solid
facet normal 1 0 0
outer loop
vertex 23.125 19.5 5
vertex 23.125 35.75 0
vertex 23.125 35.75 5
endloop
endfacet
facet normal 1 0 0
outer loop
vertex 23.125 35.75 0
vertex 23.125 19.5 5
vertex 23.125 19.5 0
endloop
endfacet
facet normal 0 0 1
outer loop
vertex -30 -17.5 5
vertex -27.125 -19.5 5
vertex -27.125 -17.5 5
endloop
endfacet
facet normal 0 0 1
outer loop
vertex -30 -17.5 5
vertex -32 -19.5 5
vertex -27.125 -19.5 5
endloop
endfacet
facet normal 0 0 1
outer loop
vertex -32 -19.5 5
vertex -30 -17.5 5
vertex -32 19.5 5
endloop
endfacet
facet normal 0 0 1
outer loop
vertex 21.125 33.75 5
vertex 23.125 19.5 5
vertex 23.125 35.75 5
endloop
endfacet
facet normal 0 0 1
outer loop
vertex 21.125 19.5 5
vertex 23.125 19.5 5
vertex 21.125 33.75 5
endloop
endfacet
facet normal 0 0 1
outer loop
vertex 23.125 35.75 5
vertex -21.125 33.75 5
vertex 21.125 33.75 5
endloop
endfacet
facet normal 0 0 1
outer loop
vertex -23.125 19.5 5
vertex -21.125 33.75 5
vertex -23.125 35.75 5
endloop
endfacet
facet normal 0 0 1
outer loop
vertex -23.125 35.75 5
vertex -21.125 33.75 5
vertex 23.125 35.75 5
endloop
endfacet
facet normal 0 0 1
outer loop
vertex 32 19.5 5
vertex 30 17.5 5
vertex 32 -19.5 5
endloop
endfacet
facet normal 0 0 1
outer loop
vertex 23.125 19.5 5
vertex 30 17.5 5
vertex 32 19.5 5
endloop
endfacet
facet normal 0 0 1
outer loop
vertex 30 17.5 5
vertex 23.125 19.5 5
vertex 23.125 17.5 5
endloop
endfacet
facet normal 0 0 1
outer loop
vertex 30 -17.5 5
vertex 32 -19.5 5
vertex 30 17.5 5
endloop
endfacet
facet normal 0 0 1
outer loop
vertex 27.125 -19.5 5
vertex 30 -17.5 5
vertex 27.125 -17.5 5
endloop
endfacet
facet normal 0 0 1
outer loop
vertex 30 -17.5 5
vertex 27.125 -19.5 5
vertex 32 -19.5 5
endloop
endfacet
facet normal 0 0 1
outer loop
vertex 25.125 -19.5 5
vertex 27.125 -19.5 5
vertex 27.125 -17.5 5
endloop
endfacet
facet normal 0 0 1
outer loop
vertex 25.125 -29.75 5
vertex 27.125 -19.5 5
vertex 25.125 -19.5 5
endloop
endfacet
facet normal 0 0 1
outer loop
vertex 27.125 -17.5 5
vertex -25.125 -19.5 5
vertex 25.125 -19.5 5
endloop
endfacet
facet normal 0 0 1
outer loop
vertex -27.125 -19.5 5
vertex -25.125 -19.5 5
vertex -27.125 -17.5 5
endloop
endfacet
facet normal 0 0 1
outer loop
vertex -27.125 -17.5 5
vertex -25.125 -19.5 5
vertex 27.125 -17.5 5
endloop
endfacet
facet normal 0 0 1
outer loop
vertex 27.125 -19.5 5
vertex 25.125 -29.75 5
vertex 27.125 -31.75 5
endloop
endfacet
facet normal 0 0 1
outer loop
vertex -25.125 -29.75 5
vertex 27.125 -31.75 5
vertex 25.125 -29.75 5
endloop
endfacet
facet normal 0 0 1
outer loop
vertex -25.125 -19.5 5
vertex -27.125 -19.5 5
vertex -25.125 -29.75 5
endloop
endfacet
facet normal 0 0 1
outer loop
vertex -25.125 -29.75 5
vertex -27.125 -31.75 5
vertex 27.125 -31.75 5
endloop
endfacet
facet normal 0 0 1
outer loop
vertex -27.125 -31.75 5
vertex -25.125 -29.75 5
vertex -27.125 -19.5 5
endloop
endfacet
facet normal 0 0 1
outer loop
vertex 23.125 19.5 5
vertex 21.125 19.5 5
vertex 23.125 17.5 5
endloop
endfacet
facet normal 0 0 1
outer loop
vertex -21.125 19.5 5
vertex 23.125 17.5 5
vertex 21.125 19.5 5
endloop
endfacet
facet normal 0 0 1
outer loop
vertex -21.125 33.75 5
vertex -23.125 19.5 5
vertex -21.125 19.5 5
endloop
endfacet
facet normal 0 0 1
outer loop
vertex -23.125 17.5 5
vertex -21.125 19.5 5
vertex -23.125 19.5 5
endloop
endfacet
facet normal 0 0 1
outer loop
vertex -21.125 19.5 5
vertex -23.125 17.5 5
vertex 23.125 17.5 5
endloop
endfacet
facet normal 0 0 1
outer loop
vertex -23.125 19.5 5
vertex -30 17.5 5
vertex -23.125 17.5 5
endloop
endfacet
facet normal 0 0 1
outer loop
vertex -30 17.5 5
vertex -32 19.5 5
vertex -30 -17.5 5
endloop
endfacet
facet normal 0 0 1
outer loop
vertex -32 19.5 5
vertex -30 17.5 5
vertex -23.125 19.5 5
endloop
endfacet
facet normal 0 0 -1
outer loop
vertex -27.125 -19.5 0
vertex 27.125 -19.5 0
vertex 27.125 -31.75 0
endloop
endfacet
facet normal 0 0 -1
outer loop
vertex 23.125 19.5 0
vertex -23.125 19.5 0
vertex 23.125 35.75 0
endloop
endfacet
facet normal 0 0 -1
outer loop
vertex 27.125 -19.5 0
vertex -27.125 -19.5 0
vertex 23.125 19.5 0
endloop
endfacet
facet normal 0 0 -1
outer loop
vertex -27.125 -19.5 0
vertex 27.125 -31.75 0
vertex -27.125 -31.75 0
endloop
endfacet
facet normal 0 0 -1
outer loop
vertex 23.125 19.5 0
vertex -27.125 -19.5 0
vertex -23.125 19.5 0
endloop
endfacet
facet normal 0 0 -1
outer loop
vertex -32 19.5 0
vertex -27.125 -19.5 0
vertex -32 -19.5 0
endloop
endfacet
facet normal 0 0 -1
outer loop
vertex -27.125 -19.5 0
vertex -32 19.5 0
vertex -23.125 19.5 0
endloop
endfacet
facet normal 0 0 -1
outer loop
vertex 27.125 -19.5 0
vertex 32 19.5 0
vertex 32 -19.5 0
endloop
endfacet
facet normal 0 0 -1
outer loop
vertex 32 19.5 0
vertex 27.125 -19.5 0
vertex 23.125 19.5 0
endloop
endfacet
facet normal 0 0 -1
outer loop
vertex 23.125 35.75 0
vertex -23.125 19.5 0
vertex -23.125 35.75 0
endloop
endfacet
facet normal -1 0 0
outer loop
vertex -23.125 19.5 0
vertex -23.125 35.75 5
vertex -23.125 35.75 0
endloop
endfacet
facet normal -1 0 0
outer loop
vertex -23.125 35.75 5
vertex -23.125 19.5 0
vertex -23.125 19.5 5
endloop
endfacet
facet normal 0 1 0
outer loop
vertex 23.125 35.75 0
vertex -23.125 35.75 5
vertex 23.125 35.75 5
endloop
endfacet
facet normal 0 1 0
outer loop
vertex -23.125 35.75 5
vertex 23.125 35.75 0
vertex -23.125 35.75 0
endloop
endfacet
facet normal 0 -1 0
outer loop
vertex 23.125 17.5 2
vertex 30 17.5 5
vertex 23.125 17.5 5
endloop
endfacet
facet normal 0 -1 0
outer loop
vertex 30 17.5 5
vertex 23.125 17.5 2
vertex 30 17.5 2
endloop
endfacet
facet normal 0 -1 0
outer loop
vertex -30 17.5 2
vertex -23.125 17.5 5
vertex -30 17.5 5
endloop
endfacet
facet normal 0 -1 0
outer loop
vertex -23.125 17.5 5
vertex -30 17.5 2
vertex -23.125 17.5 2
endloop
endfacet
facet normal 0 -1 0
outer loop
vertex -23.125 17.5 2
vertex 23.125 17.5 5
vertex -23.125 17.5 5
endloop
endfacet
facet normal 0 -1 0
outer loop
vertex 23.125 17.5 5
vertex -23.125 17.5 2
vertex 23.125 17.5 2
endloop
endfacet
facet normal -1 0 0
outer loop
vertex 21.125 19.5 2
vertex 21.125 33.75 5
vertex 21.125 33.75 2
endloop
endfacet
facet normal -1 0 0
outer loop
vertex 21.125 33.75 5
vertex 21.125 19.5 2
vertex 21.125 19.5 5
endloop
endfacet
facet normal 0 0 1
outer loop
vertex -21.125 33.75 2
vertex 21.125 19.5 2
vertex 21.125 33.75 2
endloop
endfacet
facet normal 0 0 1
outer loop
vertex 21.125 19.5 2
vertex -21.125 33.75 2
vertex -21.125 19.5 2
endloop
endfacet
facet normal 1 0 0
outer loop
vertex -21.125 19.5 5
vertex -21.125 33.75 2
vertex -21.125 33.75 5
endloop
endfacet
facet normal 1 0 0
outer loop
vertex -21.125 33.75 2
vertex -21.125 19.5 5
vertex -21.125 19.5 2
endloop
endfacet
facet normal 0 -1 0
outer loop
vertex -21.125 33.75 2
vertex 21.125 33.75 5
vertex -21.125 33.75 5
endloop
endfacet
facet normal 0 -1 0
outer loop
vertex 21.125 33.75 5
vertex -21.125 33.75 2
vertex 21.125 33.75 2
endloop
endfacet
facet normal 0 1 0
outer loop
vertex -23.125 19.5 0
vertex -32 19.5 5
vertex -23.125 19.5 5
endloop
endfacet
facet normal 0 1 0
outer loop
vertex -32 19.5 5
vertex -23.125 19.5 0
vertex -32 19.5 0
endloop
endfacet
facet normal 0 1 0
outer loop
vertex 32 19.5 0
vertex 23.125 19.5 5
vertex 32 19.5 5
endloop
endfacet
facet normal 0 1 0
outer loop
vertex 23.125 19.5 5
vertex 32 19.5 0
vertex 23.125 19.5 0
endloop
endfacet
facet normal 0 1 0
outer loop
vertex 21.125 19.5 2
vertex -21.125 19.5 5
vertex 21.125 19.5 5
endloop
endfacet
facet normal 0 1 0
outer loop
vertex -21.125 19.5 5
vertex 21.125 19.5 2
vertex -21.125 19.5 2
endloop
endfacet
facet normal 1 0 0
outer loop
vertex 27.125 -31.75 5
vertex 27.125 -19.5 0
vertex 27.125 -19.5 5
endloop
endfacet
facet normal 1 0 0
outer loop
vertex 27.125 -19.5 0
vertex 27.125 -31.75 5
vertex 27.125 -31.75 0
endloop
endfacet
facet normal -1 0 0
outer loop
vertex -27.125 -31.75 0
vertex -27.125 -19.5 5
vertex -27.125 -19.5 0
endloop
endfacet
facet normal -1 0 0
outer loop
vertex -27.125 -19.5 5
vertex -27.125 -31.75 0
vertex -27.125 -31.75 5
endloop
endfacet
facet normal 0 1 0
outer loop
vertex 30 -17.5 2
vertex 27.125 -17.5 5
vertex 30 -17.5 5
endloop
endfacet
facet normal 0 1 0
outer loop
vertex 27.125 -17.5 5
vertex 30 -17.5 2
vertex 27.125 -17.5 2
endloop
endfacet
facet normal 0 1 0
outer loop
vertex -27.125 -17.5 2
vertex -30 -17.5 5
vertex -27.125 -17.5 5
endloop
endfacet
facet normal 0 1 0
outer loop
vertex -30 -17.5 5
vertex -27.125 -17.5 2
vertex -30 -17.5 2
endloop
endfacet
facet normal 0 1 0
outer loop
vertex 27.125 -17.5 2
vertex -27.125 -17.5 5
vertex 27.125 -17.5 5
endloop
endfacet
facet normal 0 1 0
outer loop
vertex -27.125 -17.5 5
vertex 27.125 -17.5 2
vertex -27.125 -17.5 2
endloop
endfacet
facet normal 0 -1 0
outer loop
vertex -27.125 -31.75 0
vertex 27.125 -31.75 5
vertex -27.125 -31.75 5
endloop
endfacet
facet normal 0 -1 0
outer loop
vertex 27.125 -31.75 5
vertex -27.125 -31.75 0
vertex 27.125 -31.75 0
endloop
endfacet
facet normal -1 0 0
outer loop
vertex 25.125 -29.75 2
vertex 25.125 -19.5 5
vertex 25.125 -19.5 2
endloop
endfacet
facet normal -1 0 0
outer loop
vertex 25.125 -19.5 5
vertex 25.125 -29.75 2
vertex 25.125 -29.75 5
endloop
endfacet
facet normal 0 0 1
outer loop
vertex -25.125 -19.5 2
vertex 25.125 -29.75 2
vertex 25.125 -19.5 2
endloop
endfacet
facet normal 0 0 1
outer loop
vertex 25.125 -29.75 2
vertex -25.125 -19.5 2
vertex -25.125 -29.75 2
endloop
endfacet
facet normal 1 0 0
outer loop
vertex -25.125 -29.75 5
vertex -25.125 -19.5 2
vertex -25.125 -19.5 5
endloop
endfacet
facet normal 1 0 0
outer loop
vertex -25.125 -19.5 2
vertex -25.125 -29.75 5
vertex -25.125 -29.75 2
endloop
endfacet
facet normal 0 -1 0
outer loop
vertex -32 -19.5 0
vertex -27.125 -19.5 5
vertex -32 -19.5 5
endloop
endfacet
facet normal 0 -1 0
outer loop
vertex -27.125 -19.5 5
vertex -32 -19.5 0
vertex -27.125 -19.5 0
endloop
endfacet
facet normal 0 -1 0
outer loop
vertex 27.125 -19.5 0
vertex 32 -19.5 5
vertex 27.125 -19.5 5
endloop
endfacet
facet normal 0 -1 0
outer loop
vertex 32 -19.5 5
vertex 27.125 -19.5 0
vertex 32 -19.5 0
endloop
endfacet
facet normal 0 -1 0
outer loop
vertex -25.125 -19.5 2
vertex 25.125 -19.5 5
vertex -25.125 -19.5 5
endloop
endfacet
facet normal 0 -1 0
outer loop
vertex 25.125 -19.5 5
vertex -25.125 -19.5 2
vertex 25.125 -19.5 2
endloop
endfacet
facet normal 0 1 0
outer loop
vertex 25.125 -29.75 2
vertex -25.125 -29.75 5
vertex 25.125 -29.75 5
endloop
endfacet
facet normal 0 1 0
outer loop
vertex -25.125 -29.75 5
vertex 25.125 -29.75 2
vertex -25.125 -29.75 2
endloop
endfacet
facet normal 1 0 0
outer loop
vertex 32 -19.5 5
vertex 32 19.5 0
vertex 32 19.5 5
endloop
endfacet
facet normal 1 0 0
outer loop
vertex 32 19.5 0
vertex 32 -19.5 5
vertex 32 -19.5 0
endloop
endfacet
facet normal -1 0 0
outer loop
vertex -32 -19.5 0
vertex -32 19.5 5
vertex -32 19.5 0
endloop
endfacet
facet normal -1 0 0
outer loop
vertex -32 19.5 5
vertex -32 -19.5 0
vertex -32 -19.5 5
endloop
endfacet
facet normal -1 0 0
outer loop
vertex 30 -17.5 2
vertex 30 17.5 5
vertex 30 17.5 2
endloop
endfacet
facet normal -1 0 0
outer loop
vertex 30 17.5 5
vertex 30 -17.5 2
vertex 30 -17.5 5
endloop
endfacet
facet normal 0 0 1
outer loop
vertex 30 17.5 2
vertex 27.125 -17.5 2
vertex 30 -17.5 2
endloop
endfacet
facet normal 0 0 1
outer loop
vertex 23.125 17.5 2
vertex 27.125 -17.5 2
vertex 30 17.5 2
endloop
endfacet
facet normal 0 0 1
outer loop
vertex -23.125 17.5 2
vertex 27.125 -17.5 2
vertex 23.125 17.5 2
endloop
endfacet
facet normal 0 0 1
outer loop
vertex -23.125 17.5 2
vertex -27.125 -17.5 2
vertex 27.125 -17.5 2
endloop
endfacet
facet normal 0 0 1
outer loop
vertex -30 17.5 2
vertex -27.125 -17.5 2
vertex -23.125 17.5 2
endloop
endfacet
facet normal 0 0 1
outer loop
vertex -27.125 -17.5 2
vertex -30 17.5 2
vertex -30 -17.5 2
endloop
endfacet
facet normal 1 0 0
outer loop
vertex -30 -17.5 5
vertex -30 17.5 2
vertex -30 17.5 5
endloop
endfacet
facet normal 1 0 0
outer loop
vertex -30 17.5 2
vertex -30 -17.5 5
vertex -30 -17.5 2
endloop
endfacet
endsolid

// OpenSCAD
baseHeight = 2;
wallHeight = 3;
wallThickness = 2;

totalHeight = baseHeight + wallHeight;

margin = 0.25;

damageCubeSide = 10;
featureCubeSide = 14;


numberOfDamageCubes = 5;
numberOfFeatureCubes = 3;

vehicleTrayLength = 60;
vehicleTrayWidth = 35;




damageTrayLength = numberOfDamageCubes * damageCubeSide + margin;
damageTrayWidth = damageCubeSide + margin;

featureTrayLength = numberOfFeatureCubes * featureCubeSide + margin;
featureTrayWidth = featureCubeSide + margin;

hexRadius = 85/2;
insetHexRadius = hexRadius - wallThickness;
insetHeight = wallHeight + 1;


module regularPolygon(order = 6, r=1, h=1){
     angles=[ for (i = [0:order-1]) i*(360/order) ];
     coords=[ for (th=angles) [r*cos(th), r*sin(th)] ];
          linear_extrude(h) polygon(coords);
 }
 
 
//hexTray();

module hexTray() {
    difference() {
    regularPolygon(6, hexRadius, totalHeight);
    translate([0,0, baseHeight])
        regularPolygon(6, insetHexRadius, insetHeight);
}
}

//baseHeight + 

module tray(length = 1, width = 1) {
    
    wallLenght = length + 2 * wallThickness;
    wallWidth = width + 2 * wallThickness;
    
    difference() {
        translate([0,0,(totalHeight/2)])
        cube([wallLenght, wallWidth, totalHeight ], true);
        translate([0,0,baseHeight + (insetHeight/2)])
        cube([length, width, insetHeight ], true);
    }

    
}

translate([0,(vehicleTrayWidth /2 + featureTrayWidth/2 + wallThickness),0])
tray(featureTrayLength, featureTrayWidth);

translate([0,-1 * (vehicleTrayWidth /2 + damageTrayWidth/2 + wallThickness),0])
tray(damageTrayLength, damageTrayWidth);

#tray(vehicleTrayLength, vehicleTrayWidth);
